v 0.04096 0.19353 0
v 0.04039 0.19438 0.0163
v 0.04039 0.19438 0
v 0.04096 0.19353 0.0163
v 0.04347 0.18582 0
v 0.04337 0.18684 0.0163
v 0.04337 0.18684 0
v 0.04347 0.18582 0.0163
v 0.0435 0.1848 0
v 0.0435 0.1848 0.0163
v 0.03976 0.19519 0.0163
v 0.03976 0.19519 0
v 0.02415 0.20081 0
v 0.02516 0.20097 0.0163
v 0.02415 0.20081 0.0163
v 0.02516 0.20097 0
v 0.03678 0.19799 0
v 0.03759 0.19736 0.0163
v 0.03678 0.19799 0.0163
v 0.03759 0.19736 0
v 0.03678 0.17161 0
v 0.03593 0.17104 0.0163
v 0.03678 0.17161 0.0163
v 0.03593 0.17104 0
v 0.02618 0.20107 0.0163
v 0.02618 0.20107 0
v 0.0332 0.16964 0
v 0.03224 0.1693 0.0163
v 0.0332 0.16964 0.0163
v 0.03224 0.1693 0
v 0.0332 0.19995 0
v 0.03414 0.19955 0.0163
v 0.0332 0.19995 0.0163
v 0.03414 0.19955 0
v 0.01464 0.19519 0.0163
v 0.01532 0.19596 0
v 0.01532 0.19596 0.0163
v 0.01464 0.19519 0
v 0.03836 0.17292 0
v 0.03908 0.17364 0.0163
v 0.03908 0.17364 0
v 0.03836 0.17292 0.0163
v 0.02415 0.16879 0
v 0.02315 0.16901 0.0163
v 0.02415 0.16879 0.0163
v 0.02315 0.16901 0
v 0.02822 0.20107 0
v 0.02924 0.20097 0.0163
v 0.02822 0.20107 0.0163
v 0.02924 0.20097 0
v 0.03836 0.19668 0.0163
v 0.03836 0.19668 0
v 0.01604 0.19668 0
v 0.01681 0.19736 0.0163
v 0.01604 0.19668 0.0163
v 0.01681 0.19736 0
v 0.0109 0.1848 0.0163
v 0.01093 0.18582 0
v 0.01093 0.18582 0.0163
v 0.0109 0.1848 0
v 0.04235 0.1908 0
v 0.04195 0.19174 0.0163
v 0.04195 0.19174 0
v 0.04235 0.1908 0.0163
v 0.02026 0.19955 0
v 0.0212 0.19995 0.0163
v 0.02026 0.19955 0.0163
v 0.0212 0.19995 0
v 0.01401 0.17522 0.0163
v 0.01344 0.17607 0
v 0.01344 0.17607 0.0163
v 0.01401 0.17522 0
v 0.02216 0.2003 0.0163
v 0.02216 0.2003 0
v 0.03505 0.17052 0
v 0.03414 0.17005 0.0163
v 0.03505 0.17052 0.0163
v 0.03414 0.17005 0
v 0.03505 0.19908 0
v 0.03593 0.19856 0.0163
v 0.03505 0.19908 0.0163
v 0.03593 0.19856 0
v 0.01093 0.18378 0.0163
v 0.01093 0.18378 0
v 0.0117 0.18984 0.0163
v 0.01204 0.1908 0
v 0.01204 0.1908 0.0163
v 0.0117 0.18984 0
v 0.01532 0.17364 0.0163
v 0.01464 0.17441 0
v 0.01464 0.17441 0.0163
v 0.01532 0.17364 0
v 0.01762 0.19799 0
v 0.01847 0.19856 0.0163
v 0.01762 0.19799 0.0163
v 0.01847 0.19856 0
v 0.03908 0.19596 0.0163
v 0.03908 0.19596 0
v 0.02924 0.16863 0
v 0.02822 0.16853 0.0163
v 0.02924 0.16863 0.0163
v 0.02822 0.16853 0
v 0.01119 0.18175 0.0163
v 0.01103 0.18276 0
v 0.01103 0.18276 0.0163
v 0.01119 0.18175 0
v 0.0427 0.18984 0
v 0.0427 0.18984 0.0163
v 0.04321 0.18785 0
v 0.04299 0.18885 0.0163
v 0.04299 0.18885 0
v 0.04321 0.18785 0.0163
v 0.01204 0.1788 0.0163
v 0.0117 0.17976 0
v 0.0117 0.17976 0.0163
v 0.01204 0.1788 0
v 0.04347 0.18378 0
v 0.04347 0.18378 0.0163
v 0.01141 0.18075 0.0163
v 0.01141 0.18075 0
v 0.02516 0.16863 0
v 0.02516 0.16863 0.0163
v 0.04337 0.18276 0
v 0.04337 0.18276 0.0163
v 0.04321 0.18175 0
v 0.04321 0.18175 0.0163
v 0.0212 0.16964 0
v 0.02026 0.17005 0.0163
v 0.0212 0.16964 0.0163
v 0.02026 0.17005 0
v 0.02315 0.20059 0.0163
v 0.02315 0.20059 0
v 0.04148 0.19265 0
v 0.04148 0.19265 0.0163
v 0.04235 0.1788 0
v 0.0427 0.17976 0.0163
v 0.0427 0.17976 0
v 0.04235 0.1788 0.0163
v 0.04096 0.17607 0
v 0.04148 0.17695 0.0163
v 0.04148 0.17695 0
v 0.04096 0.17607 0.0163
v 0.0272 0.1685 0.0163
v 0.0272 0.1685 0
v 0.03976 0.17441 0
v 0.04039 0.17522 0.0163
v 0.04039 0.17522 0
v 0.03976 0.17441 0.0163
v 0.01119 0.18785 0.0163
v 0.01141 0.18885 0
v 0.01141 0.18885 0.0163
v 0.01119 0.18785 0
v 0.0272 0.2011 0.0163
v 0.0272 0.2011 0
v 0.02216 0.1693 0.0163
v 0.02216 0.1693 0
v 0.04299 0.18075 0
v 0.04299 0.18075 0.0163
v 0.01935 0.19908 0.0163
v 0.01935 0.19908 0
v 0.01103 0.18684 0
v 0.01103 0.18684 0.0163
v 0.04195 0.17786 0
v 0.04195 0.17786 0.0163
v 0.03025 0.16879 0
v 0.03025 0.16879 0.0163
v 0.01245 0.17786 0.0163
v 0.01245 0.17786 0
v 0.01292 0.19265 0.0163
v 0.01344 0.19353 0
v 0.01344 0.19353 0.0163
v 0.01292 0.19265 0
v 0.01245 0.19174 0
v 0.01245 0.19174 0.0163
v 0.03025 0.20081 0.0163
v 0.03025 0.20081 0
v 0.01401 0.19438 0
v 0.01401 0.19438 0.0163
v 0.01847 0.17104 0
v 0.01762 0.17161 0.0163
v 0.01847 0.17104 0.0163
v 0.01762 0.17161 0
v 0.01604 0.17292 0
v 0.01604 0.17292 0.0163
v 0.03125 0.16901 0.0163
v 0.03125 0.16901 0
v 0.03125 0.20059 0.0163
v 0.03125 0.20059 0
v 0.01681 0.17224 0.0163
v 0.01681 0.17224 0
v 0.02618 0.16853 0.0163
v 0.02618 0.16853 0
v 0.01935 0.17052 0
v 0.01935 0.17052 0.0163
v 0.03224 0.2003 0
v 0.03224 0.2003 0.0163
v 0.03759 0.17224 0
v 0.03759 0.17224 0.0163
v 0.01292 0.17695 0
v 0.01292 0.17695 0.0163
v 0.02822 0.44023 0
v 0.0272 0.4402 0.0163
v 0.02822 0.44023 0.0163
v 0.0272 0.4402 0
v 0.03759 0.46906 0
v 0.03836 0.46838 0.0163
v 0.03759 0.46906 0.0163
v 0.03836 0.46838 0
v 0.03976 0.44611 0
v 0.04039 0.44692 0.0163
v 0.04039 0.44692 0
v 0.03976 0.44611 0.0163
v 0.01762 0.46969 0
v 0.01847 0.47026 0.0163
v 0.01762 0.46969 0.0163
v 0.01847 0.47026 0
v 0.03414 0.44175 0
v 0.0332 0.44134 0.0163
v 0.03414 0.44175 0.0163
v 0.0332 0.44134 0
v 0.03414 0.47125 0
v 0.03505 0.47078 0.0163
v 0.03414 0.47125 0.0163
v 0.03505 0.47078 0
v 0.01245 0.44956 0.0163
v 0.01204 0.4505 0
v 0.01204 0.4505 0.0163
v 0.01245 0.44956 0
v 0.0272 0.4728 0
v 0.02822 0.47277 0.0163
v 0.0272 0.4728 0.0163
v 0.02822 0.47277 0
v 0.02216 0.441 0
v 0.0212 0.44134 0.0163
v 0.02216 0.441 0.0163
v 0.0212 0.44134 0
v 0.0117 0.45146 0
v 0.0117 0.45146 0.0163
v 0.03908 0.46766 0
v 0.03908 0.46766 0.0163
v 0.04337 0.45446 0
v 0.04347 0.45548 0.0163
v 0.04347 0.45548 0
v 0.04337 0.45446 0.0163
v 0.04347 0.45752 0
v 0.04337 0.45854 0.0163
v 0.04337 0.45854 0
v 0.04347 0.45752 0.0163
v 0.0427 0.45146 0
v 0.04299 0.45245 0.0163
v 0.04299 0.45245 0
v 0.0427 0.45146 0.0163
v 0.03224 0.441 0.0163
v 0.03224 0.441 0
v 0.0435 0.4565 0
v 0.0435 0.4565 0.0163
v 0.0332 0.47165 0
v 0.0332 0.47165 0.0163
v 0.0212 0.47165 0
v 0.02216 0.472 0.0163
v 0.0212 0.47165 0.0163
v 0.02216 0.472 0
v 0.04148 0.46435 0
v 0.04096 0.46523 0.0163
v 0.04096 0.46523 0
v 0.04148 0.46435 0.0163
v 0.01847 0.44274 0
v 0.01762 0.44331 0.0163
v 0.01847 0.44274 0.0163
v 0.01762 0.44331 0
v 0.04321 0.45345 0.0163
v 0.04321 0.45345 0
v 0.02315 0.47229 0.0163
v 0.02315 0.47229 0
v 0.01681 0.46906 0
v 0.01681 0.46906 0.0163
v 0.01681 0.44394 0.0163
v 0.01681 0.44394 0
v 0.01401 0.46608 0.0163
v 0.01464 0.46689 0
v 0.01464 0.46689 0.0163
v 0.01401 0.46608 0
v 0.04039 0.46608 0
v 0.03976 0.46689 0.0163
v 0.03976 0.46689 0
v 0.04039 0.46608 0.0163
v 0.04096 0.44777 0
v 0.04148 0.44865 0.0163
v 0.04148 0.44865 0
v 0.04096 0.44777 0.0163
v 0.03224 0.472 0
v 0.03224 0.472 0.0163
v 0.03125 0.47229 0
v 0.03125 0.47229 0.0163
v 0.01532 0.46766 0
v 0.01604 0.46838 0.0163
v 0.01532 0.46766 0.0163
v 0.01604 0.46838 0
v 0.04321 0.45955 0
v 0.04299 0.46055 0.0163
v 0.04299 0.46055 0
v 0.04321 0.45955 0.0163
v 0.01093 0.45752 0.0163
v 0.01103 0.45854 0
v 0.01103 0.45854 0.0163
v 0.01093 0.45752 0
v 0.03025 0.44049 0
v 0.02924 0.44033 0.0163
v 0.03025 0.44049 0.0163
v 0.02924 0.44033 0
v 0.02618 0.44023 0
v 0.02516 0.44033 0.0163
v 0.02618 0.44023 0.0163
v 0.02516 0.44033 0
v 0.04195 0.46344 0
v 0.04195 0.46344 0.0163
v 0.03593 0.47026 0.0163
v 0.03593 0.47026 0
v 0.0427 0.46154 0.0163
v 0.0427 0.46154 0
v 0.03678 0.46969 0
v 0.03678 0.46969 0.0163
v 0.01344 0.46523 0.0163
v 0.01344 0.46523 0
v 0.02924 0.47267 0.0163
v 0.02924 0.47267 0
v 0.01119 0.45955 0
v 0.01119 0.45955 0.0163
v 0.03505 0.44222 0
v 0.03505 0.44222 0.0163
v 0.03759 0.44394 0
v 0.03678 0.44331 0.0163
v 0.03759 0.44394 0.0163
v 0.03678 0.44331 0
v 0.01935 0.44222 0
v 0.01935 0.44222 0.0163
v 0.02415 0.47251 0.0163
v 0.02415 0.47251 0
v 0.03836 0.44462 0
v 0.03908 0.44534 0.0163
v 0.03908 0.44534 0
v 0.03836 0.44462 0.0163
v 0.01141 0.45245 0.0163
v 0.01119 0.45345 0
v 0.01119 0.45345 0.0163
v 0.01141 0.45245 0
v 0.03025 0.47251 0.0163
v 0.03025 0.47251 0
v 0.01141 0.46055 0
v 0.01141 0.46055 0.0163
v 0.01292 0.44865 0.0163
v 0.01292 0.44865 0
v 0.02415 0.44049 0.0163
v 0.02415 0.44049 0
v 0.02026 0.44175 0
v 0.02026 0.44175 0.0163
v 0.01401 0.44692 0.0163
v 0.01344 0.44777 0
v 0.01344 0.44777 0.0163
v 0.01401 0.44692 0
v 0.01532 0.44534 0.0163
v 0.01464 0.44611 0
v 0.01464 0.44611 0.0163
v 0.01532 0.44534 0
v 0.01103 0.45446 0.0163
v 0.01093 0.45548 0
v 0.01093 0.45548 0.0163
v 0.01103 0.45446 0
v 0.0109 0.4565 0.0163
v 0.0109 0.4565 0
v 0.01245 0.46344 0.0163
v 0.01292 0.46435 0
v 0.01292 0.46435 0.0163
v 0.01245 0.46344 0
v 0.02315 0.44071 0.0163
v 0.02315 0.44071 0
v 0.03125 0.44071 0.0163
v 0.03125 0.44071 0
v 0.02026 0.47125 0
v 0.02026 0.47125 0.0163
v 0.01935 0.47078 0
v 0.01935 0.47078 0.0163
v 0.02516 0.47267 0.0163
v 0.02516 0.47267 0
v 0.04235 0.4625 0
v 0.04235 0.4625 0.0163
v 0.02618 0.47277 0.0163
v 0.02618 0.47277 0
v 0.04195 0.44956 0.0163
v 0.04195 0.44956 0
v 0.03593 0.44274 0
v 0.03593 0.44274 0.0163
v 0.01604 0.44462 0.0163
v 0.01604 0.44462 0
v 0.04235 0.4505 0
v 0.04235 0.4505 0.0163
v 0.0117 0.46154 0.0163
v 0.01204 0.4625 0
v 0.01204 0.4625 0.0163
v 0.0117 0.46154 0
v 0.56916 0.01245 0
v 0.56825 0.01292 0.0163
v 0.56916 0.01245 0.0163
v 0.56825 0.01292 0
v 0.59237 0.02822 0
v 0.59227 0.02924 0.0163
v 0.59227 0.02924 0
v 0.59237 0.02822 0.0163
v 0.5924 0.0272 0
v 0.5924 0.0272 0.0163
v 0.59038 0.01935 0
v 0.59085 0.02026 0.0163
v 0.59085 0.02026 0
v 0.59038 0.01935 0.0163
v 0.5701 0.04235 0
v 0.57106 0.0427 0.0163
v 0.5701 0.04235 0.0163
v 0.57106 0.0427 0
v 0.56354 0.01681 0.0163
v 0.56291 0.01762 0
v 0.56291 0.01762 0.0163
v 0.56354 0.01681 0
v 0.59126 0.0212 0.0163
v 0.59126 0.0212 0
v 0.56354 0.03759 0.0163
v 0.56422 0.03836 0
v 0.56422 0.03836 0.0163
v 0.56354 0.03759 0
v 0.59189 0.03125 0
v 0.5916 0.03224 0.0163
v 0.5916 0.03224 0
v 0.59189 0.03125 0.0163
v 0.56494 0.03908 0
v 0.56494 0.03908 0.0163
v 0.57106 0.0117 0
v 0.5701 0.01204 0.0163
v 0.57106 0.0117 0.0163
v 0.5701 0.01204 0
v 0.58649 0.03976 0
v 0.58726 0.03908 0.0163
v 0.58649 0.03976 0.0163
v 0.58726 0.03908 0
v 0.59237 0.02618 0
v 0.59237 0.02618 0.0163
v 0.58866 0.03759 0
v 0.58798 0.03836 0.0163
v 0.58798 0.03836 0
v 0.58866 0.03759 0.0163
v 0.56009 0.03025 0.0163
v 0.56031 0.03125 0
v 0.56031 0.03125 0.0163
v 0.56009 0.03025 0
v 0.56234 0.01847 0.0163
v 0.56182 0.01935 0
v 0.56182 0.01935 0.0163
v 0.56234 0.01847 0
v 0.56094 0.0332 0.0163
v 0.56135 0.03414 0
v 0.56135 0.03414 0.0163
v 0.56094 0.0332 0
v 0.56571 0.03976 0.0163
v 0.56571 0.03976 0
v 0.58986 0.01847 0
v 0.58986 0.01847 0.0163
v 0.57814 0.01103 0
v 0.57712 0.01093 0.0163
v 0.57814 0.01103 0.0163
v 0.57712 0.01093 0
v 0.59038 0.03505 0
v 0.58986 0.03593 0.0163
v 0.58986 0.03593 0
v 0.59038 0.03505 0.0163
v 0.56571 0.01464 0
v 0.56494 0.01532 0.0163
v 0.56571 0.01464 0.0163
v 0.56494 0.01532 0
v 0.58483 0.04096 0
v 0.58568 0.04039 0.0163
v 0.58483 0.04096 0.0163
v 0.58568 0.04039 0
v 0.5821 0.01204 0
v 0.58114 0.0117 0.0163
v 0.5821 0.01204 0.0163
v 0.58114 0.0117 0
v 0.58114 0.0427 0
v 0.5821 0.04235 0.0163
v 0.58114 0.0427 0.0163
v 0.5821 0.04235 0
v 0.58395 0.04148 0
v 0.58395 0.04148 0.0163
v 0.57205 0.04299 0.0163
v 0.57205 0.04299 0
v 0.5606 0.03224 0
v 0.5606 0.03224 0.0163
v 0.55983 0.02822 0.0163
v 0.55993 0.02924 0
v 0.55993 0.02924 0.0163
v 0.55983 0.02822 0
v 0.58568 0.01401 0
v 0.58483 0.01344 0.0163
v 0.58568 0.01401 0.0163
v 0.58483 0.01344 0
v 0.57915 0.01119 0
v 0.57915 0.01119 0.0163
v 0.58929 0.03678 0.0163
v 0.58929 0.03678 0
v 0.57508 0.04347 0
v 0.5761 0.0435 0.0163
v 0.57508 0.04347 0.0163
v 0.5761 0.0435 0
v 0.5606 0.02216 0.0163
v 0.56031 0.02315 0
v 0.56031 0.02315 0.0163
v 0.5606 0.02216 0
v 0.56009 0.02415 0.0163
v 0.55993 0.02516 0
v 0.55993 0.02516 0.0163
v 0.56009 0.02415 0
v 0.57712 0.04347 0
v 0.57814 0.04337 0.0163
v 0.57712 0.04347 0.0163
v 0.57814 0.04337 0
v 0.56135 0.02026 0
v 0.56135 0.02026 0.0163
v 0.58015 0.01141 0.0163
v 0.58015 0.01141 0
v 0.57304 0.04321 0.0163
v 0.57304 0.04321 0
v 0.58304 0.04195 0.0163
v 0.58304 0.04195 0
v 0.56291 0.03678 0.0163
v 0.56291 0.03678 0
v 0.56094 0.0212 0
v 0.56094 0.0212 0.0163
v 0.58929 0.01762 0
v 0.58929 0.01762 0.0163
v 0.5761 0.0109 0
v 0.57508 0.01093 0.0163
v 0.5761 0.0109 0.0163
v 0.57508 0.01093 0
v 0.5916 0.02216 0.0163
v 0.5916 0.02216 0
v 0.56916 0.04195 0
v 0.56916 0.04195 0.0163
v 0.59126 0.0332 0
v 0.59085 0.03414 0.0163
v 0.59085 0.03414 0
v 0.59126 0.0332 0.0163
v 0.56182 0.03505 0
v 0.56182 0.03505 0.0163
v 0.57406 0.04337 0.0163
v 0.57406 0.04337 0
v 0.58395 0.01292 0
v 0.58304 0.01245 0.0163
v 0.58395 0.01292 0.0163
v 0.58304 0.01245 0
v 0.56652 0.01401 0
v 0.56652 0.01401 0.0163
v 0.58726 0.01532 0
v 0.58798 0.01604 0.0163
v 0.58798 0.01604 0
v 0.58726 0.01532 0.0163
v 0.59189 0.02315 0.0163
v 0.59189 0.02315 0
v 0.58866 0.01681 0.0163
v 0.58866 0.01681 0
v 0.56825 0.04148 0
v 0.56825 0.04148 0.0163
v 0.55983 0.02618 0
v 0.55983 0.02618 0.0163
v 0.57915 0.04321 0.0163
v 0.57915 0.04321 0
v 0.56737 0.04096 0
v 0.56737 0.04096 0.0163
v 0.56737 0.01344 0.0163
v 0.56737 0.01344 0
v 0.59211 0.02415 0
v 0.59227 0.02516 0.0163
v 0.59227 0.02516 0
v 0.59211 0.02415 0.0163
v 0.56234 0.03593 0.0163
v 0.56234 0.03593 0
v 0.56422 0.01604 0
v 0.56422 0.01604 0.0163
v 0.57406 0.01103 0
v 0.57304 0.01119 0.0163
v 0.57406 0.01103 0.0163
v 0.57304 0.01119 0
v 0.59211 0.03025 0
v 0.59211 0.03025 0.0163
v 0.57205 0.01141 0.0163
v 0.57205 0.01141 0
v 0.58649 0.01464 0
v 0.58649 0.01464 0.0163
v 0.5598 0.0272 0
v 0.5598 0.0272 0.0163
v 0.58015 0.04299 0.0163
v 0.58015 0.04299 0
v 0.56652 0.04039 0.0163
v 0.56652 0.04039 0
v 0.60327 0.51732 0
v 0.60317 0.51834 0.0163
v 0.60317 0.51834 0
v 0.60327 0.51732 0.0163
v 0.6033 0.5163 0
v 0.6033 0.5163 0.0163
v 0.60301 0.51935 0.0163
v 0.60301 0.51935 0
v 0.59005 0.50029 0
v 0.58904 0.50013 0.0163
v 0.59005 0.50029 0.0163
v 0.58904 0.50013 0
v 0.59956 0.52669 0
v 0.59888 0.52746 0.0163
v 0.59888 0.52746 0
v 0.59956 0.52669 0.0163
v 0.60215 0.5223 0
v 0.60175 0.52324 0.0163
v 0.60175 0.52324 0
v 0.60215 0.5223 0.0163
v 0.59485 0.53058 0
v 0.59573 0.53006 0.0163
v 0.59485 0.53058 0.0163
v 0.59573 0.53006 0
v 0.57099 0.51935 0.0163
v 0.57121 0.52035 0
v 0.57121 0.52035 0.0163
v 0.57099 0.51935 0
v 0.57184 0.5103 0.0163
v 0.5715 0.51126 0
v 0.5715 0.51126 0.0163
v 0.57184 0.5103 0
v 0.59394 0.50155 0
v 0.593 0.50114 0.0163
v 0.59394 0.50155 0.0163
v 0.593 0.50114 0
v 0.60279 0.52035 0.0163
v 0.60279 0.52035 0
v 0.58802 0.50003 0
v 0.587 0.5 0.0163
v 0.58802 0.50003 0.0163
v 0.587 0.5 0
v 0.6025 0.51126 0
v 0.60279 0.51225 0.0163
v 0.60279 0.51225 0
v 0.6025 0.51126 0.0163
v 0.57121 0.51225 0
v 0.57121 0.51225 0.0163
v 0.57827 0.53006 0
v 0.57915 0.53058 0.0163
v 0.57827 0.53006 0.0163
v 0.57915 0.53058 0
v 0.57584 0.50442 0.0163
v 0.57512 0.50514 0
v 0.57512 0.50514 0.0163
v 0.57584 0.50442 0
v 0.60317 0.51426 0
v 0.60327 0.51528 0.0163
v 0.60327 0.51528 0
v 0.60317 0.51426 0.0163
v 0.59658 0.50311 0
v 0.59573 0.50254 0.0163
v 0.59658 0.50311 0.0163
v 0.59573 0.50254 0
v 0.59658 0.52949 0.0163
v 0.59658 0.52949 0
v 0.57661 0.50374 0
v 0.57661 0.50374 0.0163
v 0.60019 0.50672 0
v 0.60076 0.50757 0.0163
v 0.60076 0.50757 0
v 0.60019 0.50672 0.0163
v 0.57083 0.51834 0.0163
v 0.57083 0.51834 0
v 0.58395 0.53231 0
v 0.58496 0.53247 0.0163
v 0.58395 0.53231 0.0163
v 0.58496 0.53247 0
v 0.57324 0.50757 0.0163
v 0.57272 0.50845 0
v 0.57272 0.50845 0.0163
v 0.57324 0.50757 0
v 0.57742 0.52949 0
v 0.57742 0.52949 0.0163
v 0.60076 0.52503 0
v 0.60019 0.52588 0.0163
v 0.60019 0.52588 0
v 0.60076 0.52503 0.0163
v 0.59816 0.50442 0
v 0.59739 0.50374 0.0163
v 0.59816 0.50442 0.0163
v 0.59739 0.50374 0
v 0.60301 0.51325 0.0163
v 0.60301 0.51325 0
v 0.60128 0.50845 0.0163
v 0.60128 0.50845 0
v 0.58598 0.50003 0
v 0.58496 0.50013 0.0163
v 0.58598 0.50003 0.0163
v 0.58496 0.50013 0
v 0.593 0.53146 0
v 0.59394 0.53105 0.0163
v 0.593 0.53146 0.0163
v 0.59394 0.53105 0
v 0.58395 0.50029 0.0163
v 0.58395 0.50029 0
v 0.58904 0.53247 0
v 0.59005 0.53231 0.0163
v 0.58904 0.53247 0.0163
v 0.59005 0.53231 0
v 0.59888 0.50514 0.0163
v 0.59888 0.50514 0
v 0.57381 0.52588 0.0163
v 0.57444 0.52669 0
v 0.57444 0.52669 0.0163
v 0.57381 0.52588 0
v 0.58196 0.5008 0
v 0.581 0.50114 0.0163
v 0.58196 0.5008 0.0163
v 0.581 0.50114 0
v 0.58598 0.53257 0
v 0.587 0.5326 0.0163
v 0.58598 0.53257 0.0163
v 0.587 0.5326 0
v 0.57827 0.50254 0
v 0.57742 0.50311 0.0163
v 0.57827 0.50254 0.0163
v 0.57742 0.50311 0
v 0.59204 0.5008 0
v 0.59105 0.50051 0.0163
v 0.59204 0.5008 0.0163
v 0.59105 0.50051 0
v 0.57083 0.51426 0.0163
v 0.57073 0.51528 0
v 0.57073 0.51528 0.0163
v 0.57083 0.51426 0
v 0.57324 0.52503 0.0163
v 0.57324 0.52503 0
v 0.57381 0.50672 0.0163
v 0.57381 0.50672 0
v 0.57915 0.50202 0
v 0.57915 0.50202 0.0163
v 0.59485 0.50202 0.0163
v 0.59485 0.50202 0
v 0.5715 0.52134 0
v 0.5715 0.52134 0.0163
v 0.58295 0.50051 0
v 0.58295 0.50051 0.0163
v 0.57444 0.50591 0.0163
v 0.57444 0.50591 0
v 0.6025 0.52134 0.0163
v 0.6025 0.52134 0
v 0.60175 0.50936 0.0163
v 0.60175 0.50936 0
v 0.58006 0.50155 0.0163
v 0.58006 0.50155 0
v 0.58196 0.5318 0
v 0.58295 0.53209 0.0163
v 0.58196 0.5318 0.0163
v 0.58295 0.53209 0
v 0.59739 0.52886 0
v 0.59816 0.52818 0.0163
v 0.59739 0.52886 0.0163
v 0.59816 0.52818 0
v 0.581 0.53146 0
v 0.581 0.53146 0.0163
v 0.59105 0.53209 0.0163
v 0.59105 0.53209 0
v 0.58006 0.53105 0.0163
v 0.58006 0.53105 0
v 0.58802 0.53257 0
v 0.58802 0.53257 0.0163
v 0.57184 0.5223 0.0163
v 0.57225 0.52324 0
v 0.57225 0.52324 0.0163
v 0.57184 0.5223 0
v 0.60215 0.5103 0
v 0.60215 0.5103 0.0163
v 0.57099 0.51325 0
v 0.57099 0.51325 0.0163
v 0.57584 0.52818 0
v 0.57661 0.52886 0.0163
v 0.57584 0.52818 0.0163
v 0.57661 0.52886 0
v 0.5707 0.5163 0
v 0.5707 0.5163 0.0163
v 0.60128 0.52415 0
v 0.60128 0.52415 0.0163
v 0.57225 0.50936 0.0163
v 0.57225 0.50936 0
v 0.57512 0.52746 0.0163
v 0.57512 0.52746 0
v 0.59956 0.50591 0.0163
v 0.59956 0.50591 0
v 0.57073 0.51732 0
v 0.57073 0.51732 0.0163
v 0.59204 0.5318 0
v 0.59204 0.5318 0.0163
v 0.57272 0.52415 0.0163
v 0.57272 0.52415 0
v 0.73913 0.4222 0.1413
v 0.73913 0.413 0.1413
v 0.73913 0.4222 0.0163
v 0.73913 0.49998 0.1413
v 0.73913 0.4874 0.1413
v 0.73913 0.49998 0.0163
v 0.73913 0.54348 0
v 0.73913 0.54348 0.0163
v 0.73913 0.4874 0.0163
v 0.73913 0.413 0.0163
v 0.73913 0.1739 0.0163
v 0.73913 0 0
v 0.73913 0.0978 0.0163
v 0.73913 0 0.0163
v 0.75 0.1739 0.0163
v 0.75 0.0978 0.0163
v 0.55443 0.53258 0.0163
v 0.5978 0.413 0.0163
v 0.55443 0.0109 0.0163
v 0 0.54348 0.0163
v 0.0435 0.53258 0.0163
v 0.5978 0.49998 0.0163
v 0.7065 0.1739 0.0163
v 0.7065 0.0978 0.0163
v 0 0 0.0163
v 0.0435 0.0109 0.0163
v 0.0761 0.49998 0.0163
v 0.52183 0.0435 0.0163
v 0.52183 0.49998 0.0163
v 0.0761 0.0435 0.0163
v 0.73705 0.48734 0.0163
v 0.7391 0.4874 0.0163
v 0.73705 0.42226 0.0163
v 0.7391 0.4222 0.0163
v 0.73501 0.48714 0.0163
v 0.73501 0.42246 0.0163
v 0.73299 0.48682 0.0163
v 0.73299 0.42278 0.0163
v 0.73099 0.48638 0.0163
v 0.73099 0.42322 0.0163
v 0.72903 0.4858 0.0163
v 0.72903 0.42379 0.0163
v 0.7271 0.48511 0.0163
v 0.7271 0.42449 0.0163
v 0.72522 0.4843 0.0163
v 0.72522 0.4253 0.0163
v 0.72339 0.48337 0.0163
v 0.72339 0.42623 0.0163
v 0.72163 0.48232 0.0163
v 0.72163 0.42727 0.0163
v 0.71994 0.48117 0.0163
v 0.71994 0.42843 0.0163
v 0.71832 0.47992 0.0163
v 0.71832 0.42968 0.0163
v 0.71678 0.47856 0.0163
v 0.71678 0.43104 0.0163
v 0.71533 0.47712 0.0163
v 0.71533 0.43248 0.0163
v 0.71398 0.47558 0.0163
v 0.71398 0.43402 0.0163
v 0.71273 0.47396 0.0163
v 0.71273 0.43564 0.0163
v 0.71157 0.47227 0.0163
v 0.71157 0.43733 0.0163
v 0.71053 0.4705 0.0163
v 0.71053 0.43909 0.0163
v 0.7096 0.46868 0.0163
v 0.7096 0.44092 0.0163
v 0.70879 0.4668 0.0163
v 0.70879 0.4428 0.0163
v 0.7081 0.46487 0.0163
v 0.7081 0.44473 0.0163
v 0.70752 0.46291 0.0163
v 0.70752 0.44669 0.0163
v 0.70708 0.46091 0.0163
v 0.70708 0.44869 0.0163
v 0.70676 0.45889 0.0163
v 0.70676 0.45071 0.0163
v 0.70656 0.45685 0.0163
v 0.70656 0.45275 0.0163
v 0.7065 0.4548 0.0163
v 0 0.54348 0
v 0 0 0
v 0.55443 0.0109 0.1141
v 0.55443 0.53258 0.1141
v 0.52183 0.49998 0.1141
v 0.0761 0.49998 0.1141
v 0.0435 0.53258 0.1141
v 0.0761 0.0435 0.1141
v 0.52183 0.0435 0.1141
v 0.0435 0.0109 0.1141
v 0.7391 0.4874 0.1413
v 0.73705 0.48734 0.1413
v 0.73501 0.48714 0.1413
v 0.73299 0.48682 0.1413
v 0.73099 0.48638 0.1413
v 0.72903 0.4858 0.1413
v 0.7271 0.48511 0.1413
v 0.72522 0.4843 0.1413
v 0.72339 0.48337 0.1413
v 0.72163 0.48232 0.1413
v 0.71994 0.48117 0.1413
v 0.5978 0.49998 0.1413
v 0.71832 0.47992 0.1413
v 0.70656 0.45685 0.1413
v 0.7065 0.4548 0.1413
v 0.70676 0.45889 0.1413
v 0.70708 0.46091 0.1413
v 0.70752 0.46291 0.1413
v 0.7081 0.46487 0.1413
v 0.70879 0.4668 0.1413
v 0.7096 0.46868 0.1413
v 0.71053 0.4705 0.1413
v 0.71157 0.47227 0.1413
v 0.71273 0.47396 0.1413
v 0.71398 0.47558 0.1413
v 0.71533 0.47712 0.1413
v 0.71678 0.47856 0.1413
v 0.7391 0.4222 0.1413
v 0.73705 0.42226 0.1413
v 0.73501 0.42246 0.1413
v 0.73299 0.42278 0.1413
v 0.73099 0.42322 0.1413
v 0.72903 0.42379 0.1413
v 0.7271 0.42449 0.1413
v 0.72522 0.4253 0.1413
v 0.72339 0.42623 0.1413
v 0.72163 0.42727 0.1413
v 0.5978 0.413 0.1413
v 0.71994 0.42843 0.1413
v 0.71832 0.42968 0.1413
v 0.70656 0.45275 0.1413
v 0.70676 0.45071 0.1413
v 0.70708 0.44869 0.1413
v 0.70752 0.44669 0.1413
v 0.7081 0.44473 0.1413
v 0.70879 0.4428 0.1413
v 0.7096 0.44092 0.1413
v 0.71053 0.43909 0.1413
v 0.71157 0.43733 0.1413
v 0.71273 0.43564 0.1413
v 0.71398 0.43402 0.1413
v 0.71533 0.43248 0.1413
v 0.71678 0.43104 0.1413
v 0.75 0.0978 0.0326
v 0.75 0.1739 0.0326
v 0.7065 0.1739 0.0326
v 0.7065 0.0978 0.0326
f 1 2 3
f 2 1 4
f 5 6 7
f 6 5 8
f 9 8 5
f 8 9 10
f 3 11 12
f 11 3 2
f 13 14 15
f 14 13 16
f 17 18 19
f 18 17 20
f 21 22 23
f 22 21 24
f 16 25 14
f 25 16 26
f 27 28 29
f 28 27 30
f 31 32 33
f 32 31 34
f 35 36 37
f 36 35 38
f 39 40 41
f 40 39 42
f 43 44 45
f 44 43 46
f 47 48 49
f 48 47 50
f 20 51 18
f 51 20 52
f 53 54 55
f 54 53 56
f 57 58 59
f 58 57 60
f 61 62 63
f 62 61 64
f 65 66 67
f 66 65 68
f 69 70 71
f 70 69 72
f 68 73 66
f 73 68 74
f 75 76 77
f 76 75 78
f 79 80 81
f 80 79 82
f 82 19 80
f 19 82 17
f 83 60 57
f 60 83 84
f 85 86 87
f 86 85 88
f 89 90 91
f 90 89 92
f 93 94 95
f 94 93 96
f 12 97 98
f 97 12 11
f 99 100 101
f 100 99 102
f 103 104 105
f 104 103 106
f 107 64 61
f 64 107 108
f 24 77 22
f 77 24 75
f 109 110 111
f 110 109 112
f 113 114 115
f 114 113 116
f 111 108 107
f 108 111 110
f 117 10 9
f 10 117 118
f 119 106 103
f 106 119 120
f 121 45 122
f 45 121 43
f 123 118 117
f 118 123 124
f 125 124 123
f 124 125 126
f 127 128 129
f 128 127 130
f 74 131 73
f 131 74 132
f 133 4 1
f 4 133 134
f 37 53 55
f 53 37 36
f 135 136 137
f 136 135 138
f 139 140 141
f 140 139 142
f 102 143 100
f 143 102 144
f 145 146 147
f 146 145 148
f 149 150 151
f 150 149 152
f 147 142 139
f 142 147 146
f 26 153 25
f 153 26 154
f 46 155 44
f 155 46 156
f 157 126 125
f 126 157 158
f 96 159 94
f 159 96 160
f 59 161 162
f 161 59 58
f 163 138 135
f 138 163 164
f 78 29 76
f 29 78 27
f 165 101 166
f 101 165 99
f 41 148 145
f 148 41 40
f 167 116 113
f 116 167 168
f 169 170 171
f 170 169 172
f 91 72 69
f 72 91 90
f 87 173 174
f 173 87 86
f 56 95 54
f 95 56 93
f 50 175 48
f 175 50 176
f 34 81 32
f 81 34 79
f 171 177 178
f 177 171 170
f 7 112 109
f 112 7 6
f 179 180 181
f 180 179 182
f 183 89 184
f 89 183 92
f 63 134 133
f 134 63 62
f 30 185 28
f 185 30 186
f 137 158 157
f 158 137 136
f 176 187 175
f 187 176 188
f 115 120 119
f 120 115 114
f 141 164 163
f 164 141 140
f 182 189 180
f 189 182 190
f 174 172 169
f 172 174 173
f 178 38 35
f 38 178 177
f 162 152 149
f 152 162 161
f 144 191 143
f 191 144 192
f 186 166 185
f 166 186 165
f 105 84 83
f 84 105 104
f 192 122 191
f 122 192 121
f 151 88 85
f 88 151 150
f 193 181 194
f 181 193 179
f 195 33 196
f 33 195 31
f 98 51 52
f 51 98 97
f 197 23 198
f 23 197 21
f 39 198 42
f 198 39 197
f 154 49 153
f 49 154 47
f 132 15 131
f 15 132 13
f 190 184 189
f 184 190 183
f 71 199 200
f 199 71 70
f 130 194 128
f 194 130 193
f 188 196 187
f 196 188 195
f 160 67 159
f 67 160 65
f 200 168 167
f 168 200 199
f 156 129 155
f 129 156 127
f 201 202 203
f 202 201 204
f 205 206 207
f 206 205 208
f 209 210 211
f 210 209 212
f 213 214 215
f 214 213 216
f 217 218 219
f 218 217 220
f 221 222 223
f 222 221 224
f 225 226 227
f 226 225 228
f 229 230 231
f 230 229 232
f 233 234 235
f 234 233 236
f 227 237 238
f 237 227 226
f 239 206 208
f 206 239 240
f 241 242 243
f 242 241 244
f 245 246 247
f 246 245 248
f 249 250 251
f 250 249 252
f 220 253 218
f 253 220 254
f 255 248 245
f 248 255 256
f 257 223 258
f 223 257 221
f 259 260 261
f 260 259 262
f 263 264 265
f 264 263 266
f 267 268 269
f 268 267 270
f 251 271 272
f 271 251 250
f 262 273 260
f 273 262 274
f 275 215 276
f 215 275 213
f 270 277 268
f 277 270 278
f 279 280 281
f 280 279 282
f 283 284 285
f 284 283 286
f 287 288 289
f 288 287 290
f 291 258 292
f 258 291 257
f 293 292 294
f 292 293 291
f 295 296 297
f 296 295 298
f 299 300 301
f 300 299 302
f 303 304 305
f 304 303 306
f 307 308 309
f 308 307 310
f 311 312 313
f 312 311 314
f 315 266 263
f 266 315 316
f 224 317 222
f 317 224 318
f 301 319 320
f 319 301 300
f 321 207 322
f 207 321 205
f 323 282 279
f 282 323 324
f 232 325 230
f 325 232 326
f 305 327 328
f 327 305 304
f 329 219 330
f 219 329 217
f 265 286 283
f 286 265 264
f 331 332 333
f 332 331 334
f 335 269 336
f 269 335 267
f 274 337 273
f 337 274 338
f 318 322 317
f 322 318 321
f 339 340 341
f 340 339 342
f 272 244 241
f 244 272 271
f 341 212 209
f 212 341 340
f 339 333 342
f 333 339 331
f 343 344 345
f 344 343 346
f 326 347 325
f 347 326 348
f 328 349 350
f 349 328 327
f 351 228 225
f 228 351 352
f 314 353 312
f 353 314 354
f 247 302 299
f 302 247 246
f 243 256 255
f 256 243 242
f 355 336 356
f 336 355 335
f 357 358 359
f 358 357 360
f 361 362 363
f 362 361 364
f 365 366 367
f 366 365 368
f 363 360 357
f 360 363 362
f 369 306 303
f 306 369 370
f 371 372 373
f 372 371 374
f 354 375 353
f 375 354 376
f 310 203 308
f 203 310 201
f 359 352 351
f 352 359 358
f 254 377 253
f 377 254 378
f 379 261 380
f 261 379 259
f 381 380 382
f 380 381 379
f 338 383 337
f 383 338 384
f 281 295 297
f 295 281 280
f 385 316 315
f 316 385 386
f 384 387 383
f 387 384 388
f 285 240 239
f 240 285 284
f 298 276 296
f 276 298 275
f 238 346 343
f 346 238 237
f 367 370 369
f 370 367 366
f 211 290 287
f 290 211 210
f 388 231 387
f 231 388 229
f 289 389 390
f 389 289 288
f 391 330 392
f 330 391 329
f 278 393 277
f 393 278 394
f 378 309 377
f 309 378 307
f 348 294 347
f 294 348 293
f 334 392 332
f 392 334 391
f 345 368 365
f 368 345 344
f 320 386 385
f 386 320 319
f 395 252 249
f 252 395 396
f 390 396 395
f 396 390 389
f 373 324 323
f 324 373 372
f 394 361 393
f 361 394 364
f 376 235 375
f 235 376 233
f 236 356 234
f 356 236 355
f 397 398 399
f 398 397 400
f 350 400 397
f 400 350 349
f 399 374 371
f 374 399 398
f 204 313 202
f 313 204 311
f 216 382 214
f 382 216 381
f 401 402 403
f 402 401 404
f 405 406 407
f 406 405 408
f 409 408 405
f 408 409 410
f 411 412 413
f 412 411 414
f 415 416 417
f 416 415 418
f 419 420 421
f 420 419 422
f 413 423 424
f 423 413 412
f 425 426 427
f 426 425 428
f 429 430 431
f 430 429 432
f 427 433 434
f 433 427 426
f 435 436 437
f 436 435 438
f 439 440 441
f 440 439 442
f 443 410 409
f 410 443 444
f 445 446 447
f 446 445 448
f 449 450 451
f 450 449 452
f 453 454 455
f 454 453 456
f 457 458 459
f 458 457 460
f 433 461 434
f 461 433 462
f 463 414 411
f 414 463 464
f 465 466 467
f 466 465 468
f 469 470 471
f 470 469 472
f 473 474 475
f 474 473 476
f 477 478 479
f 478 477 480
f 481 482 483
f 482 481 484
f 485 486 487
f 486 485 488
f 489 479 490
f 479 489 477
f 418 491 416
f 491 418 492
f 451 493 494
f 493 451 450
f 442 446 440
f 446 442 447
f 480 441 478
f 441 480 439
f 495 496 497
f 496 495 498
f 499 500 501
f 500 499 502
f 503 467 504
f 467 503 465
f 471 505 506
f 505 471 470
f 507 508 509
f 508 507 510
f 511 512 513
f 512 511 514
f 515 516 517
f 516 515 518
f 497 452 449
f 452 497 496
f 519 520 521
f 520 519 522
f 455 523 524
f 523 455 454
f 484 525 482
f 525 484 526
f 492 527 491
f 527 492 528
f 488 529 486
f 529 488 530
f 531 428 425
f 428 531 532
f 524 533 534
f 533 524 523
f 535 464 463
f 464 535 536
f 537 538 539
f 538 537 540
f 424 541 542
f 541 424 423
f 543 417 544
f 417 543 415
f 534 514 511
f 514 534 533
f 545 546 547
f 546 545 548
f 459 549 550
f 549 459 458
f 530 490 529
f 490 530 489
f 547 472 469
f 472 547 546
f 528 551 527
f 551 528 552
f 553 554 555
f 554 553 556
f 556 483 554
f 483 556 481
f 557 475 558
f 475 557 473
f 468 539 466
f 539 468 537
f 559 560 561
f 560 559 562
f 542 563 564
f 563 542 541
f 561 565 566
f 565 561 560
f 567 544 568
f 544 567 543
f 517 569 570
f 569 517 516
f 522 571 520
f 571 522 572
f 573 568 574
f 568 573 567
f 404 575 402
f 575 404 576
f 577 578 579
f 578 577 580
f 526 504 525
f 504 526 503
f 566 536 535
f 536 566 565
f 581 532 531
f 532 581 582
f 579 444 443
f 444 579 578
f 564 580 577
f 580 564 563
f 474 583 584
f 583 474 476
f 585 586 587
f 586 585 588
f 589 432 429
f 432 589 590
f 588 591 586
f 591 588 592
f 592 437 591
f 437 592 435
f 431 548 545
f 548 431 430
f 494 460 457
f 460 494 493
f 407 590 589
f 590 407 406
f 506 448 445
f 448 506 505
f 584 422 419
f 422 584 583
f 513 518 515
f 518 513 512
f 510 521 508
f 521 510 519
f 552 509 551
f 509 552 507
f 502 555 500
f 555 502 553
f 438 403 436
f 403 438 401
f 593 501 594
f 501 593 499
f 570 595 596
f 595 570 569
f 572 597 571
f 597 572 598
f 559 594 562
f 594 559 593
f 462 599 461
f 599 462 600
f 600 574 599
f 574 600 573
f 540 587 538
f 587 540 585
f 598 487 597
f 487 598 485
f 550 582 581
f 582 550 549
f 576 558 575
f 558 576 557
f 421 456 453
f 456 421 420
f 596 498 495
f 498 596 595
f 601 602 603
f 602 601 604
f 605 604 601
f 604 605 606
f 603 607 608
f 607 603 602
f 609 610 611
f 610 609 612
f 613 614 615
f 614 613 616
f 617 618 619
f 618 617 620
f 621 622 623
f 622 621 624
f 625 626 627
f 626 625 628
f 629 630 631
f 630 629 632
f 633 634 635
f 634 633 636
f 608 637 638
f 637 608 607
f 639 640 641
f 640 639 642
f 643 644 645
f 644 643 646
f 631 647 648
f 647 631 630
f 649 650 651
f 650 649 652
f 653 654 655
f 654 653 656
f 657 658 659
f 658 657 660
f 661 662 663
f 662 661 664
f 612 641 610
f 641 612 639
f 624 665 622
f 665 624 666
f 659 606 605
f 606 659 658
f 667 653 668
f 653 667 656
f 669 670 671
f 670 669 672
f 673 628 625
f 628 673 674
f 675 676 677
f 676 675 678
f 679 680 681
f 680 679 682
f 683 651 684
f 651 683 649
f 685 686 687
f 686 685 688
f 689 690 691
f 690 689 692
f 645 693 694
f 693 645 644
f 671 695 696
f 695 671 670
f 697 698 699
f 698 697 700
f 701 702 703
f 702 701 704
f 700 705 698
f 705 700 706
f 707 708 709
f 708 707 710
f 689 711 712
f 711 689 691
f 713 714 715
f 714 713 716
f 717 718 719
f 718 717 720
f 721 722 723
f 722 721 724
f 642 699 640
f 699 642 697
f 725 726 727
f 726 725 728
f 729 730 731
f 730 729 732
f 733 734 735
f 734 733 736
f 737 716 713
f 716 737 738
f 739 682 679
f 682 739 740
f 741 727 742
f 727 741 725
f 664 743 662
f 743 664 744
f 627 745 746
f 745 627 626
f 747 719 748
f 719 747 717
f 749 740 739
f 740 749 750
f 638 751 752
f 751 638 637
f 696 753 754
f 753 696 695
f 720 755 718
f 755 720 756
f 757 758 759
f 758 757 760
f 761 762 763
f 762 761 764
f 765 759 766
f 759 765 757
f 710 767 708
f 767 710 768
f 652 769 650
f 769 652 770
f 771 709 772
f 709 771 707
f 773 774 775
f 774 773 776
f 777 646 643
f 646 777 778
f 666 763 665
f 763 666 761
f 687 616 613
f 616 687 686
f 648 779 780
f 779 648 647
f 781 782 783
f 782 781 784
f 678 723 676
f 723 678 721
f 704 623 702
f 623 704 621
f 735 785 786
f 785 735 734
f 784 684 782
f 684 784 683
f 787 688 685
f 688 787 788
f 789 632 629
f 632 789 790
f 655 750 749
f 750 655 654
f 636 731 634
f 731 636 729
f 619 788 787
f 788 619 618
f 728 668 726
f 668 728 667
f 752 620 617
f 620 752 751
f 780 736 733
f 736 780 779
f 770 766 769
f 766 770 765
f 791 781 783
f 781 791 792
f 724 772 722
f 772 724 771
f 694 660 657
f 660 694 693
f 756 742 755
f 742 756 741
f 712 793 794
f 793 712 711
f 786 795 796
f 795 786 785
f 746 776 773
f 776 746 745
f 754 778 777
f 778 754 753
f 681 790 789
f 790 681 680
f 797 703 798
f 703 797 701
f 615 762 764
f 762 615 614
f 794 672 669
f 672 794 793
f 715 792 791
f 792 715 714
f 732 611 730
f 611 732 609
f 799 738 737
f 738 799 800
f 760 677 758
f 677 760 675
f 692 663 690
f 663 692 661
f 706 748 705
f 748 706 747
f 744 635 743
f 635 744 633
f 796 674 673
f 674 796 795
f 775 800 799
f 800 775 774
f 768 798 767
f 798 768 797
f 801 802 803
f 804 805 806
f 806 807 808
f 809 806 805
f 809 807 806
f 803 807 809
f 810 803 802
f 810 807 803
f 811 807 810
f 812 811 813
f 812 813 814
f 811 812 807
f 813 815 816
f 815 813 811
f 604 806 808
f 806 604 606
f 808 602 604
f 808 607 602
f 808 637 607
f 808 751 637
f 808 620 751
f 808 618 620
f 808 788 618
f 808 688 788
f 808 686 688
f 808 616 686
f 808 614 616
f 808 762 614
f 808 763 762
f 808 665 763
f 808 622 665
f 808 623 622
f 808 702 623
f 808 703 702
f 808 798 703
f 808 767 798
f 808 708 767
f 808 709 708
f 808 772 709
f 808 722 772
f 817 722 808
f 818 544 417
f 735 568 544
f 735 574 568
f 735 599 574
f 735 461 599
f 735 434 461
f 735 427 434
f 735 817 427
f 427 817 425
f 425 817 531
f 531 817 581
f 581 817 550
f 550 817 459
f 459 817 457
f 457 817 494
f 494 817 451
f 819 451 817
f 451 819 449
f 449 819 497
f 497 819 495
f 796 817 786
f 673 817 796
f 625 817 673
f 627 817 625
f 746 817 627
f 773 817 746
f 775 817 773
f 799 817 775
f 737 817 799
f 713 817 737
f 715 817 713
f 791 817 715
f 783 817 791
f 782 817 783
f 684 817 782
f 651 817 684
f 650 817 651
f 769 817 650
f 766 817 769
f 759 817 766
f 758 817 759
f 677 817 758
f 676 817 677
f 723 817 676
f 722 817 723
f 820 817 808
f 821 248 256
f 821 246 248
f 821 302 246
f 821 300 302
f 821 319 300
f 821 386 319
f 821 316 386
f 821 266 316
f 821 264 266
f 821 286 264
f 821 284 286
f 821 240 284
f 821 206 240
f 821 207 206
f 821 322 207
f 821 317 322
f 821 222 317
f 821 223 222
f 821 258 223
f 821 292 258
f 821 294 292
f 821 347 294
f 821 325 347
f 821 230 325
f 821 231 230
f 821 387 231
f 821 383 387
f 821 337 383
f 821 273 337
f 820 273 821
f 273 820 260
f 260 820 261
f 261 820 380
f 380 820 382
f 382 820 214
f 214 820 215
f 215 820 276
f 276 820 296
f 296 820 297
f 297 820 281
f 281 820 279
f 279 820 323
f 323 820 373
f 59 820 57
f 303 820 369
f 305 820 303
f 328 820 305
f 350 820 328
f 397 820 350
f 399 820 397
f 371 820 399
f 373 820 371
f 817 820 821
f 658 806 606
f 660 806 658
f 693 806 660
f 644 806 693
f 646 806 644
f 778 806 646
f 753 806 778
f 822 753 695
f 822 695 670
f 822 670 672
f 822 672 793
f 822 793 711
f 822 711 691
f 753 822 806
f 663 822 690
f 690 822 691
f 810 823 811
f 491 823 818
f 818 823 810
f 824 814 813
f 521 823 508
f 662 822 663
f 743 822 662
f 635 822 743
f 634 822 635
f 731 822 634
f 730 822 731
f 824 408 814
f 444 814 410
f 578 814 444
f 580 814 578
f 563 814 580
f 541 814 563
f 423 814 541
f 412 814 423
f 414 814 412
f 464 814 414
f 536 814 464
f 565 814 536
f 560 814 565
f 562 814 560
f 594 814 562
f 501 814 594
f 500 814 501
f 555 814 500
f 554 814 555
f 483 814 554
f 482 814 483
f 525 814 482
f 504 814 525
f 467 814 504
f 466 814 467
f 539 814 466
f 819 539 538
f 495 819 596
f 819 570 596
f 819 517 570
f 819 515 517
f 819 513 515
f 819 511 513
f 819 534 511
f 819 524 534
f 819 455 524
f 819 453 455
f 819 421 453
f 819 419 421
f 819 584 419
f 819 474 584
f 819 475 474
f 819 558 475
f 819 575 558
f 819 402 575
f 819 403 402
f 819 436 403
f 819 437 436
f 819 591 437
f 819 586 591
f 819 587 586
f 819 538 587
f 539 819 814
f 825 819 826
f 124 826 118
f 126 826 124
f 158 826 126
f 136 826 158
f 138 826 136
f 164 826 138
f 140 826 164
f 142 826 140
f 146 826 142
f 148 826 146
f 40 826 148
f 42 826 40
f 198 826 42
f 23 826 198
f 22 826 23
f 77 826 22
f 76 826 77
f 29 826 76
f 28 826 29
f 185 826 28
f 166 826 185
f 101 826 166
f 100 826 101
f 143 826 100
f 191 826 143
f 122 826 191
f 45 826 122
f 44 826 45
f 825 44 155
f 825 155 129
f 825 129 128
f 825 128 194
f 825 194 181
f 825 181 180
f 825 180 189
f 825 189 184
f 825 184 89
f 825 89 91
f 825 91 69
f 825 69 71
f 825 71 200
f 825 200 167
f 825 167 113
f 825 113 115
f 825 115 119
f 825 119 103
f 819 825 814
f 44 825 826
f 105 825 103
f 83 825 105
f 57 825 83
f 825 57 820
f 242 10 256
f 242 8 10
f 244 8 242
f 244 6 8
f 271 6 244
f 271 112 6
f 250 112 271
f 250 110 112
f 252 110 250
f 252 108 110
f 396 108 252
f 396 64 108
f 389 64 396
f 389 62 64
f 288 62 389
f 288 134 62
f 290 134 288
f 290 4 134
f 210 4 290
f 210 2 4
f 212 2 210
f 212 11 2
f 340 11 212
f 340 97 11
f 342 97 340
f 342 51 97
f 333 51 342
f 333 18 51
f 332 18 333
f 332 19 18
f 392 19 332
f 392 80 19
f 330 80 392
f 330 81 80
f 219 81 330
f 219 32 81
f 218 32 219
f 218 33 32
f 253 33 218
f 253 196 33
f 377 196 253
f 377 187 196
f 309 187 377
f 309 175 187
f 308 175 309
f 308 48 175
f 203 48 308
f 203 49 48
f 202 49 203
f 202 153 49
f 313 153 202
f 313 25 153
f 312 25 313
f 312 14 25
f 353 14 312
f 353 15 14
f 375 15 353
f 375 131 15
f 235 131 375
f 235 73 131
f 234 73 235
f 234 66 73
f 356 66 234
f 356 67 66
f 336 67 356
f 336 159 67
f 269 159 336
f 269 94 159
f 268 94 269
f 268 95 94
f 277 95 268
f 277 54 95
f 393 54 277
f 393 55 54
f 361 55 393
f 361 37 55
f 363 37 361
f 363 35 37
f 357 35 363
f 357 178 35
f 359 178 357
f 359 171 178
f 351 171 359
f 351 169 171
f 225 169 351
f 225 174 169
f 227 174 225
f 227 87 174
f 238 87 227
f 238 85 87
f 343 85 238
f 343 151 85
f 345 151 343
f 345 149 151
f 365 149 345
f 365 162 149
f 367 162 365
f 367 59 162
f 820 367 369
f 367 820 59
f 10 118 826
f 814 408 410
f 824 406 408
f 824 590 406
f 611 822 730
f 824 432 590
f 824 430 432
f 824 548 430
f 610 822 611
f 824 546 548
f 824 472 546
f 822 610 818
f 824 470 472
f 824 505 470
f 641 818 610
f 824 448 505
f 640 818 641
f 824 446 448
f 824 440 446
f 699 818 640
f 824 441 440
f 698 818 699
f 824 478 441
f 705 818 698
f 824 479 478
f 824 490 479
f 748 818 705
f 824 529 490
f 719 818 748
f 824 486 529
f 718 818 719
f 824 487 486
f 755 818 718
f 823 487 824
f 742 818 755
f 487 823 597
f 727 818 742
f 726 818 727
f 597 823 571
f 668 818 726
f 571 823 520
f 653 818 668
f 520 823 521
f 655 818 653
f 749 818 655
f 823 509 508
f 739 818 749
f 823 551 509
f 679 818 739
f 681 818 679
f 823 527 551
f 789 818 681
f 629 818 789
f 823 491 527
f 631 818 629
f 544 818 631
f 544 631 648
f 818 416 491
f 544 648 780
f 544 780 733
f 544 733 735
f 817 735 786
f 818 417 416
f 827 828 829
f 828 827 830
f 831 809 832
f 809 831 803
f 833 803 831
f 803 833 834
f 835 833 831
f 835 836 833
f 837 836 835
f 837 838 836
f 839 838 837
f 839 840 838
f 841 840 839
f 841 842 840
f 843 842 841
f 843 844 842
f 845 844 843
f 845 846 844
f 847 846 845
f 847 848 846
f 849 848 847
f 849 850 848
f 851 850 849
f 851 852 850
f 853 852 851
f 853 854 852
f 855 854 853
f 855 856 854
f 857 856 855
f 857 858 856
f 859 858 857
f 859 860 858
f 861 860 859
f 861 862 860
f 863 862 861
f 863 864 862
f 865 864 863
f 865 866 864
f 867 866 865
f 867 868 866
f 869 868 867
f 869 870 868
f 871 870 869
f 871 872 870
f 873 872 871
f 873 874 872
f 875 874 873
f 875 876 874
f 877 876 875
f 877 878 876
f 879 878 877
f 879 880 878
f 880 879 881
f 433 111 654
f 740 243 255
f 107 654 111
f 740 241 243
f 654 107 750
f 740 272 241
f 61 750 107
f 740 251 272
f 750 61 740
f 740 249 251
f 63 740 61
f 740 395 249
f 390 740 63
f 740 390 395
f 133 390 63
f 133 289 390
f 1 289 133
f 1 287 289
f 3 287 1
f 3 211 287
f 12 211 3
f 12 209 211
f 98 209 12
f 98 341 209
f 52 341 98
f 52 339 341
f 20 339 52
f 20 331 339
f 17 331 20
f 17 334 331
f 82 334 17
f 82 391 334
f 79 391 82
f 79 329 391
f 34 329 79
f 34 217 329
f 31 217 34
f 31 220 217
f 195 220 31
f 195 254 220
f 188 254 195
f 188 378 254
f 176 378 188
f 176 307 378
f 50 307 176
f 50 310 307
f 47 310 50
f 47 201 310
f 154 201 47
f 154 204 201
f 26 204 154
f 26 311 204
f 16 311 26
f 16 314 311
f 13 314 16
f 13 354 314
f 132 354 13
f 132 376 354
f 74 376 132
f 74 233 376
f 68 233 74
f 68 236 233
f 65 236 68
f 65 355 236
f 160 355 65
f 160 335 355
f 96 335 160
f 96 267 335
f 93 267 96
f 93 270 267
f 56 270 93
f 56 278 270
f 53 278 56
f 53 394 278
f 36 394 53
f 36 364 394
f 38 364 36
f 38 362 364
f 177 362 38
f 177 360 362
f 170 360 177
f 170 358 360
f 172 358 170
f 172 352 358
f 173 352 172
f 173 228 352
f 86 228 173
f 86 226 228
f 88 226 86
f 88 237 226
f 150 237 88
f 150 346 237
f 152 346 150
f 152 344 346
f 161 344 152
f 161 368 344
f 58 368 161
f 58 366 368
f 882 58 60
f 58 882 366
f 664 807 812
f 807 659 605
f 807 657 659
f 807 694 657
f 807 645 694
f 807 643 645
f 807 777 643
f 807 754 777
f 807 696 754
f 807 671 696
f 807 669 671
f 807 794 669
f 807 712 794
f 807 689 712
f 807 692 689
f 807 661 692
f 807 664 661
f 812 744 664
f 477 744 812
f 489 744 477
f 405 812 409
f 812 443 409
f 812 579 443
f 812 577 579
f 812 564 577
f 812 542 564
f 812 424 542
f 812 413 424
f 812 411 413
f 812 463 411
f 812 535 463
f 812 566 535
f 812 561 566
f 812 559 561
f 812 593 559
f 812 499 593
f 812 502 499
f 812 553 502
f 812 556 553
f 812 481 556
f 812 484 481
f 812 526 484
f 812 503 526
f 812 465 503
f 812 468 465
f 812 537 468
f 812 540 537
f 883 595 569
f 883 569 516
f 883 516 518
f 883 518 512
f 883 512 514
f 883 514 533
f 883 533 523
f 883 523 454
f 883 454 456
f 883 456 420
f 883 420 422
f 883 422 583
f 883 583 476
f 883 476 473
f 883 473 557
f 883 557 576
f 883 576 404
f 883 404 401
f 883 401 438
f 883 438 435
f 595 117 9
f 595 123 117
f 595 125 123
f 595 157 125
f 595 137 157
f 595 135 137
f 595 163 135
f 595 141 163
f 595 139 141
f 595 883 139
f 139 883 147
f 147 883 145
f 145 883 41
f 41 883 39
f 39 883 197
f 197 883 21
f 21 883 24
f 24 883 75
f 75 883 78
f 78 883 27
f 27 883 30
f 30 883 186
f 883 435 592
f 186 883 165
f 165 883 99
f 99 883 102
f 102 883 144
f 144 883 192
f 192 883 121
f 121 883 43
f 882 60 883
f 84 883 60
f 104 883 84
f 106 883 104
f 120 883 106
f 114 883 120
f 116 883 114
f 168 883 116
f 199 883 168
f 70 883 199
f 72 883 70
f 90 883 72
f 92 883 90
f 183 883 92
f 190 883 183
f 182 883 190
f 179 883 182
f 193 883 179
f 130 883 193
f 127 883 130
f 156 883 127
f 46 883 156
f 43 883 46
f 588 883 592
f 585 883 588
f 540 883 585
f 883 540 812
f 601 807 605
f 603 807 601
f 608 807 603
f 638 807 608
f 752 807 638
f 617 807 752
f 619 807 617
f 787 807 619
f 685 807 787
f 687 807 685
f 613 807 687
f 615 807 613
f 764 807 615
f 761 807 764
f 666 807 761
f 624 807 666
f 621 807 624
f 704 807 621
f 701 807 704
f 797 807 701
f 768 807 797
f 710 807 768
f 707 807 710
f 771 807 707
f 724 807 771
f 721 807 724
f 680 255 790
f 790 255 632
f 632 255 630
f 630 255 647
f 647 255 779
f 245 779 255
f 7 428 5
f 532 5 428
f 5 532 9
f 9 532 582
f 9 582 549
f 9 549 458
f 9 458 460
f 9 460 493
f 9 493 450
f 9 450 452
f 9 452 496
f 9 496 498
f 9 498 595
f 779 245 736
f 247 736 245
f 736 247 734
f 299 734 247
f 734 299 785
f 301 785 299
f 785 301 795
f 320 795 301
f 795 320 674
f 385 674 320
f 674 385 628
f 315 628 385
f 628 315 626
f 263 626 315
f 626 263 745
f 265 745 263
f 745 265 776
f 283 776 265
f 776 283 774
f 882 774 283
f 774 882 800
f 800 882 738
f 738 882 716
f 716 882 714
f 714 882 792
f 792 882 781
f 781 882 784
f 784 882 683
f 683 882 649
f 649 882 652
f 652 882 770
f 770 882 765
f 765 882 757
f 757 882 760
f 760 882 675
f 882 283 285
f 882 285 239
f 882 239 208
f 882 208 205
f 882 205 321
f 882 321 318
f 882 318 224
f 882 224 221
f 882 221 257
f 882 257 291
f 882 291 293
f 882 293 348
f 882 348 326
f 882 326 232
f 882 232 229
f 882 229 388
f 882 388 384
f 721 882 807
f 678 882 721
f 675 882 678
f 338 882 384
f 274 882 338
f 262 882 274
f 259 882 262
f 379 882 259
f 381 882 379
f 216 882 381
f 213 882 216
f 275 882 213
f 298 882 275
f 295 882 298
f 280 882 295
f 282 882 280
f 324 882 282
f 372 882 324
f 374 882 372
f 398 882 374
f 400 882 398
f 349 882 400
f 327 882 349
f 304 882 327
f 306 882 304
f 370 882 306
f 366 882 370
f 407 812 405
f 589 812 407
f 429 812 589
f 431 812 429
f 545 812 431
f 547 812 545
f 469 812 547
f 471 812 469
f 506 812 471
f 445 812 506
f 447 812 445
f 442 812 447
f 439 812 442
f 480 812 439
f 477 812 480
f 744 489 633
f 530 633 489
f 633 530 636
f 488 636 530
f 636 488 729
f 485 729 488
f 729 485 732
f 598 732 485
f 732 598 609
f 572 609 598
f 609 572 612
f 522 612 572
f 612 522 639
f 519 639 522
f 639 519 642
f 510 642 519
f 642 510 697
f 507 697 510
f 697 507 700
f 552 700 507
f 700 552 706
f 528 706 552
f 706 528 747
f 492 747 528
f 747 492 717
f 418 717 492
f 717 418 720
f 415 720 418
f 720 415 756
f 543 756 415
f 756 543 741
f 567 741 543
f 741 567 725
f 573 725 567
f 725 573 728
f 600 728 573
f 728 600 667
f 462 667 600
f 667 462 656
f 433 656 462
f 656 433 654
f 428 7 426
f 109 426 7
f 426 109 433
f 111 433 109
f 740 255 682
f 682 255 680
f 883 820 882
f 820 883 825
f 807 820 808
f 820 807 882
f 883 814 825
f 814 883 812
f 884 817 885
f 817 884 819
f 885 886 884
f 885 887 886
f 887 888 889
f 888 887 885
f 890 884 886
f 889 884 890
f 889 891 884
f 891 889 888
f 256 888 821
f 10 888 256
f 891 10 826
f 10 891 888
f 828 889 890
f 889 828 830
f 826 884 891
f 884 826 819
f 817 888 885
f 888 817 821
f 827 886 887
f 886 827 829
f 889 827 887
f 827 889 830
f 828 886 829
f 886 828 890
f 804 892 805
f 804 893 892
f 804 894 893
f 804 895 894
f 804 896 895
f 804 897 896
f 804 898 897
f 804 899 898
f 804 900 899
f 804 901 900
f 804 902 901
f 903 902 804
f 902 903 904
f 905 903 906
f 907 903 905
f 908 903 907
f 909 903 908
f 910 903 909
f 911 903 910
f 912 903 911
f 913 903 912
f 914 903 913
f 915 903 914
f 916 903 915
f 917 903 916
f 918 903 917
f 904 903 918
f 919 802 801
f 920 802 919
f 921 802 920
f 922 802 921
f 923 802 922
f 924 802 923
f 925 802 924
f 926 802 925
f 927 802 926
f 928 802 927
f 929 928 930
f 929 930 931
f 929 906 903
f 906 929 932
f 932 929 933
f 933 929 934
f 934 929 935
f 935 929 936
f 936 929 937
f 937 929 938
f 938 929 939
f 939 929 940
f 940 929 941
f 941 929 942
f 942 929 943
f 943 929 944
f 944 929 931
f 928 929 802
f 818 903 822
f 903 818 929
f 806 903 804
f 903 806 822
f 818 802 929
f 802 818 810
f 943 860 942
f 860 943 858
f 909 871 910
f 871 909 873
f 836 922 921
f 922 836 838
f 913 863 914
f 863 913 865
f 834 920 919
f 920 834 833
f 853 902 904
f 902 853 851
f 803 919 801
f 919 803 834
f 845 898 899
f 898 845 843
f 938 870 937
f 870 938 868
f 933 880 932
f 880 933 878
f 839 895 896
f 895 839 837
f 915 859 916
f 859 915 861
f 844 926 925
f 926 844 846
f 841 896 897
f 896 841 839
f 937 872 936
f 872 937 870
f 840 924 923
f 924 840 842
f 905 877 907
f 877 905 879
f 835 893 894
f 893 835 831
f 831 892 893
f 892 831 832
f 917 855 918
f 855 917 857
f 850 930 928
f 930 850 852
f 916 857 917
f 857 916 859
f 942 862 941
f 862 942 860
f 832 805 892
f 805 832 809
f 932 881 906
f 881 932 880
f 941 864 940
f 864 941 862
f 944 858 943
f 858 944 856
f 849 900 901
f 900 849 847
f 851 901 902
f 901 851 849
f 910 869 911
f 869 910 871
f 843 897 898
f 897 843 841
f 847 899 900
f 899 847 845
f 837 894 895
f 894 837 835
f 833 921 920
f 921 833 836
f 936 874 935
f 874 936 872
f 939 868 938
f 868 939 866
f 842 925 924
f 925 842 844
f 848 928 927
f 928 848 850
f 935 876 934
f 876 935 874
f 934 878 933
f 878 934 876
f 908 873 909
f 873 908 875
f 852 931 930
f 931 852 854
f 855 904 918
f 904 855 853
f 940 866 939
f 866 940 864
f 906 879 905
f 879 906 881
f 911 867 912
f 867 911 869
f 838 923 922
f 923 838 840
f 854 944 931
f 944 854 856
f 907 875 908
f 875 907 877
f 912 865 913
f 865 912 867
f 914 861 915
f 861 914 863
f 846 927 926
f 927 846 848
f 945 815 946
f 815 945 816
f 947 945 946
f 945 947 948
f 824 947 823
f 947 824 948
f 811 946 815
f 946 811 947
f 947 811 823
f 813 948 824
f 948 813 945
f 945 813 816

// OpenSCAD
// Parametric dimensions
base_length = 0.73913;
base_width = 0.543478;
base_height = 0.016304;

hole_radius = 0.0163;
$fn = 100;

// Base through-hole centers: [x, y]
base_holes = [
    [0.0272, 0.1848],
    [0.0272, 0.4565],
    [0.5761, 0.0272],
    [0.587, 0.5163]
];

// Main raised rail group parameters
rail_left   = 0.0435;
rail_right  = 0.1847;
rail_front  = 0.0109;
rail_back   = 0.0109;
rail_height = 0.0978;
rail_thick  = 0.0326;   // rib wall thickness

// Shallow tab parameters
tab_length = 0.0435;
tab_width  = 0.0761;
tab_left   = 0.7065;
tab_front  = 0.0978;
tab_height = 0.0163;

// Deeper side block parameters
// Footprint derived from offsets to ensure placement matches
block_left   = 0.5978;
block_front  = 0.413;
block_length = base_length - block_left;                 // 0.14133
block_width  = base_width - block_front - 0.0435;        // 0.086978
block_height = 0.141304;
block_hole_x = 0.7391;
block_hole_y = 0.4548;
block_hole_r = 0.0326;

// Main rectangular base with four circular through openings
module base_plate() {
    difference() {
        cube([base_length, base_width, base_height]);
        for (p = base_holes) {
            translate([p[0], p[1], -0.01])
                cylinder(h = base_height + 0.02, r = hole_radius);
        }
    }
}

// Raised rail group as separate solid rectangular ribs (outline)
module rail_group() {
    rail_w = base_length - rail_left - rail_right;
    rail_d = base_width - rail_front - rail_back;
    z0     = base_height;

    // Bottom rib
    translate([rail_left, rail_front, z0])
        cube([rail_w, rail_thick, rail_height]);

    // Top rib
    translate([rail_left, base_width - rail_back - rail_thick, z0])
        cube([rail_w, rail_thick, rail_height]);

    // Left rib
    translate([rail_left, rail_front, z0])
        cube([rail_thick, rail_d, rail_height]);

    // Right rib
    translate([base_length - rail_right - rail_thick, rail_front, z0])
        cube([rail_thick, rail_d, rail_height]);
}

// Shallow rectangular tab on upper face
module shallow_tab() {
    translate([tab_left, tab_front, base_height])
        cube([tab_length, tab_width, tab_height]);
}

// Deeper side solid block with through opening
module side_block() {
    difference() {
        translate([block_left, block_front, 0])
            cube([block_length, block_width, block_height]);
        translate([block_hole_x, block_hole_y, -0.01])
            cylinder(h = block_height + 0.02, r = block_hole_r);
    }
}

// Assembly
union() {
    base_plate();
    rail_group();
    shallow_tab();
    side_block();
}
